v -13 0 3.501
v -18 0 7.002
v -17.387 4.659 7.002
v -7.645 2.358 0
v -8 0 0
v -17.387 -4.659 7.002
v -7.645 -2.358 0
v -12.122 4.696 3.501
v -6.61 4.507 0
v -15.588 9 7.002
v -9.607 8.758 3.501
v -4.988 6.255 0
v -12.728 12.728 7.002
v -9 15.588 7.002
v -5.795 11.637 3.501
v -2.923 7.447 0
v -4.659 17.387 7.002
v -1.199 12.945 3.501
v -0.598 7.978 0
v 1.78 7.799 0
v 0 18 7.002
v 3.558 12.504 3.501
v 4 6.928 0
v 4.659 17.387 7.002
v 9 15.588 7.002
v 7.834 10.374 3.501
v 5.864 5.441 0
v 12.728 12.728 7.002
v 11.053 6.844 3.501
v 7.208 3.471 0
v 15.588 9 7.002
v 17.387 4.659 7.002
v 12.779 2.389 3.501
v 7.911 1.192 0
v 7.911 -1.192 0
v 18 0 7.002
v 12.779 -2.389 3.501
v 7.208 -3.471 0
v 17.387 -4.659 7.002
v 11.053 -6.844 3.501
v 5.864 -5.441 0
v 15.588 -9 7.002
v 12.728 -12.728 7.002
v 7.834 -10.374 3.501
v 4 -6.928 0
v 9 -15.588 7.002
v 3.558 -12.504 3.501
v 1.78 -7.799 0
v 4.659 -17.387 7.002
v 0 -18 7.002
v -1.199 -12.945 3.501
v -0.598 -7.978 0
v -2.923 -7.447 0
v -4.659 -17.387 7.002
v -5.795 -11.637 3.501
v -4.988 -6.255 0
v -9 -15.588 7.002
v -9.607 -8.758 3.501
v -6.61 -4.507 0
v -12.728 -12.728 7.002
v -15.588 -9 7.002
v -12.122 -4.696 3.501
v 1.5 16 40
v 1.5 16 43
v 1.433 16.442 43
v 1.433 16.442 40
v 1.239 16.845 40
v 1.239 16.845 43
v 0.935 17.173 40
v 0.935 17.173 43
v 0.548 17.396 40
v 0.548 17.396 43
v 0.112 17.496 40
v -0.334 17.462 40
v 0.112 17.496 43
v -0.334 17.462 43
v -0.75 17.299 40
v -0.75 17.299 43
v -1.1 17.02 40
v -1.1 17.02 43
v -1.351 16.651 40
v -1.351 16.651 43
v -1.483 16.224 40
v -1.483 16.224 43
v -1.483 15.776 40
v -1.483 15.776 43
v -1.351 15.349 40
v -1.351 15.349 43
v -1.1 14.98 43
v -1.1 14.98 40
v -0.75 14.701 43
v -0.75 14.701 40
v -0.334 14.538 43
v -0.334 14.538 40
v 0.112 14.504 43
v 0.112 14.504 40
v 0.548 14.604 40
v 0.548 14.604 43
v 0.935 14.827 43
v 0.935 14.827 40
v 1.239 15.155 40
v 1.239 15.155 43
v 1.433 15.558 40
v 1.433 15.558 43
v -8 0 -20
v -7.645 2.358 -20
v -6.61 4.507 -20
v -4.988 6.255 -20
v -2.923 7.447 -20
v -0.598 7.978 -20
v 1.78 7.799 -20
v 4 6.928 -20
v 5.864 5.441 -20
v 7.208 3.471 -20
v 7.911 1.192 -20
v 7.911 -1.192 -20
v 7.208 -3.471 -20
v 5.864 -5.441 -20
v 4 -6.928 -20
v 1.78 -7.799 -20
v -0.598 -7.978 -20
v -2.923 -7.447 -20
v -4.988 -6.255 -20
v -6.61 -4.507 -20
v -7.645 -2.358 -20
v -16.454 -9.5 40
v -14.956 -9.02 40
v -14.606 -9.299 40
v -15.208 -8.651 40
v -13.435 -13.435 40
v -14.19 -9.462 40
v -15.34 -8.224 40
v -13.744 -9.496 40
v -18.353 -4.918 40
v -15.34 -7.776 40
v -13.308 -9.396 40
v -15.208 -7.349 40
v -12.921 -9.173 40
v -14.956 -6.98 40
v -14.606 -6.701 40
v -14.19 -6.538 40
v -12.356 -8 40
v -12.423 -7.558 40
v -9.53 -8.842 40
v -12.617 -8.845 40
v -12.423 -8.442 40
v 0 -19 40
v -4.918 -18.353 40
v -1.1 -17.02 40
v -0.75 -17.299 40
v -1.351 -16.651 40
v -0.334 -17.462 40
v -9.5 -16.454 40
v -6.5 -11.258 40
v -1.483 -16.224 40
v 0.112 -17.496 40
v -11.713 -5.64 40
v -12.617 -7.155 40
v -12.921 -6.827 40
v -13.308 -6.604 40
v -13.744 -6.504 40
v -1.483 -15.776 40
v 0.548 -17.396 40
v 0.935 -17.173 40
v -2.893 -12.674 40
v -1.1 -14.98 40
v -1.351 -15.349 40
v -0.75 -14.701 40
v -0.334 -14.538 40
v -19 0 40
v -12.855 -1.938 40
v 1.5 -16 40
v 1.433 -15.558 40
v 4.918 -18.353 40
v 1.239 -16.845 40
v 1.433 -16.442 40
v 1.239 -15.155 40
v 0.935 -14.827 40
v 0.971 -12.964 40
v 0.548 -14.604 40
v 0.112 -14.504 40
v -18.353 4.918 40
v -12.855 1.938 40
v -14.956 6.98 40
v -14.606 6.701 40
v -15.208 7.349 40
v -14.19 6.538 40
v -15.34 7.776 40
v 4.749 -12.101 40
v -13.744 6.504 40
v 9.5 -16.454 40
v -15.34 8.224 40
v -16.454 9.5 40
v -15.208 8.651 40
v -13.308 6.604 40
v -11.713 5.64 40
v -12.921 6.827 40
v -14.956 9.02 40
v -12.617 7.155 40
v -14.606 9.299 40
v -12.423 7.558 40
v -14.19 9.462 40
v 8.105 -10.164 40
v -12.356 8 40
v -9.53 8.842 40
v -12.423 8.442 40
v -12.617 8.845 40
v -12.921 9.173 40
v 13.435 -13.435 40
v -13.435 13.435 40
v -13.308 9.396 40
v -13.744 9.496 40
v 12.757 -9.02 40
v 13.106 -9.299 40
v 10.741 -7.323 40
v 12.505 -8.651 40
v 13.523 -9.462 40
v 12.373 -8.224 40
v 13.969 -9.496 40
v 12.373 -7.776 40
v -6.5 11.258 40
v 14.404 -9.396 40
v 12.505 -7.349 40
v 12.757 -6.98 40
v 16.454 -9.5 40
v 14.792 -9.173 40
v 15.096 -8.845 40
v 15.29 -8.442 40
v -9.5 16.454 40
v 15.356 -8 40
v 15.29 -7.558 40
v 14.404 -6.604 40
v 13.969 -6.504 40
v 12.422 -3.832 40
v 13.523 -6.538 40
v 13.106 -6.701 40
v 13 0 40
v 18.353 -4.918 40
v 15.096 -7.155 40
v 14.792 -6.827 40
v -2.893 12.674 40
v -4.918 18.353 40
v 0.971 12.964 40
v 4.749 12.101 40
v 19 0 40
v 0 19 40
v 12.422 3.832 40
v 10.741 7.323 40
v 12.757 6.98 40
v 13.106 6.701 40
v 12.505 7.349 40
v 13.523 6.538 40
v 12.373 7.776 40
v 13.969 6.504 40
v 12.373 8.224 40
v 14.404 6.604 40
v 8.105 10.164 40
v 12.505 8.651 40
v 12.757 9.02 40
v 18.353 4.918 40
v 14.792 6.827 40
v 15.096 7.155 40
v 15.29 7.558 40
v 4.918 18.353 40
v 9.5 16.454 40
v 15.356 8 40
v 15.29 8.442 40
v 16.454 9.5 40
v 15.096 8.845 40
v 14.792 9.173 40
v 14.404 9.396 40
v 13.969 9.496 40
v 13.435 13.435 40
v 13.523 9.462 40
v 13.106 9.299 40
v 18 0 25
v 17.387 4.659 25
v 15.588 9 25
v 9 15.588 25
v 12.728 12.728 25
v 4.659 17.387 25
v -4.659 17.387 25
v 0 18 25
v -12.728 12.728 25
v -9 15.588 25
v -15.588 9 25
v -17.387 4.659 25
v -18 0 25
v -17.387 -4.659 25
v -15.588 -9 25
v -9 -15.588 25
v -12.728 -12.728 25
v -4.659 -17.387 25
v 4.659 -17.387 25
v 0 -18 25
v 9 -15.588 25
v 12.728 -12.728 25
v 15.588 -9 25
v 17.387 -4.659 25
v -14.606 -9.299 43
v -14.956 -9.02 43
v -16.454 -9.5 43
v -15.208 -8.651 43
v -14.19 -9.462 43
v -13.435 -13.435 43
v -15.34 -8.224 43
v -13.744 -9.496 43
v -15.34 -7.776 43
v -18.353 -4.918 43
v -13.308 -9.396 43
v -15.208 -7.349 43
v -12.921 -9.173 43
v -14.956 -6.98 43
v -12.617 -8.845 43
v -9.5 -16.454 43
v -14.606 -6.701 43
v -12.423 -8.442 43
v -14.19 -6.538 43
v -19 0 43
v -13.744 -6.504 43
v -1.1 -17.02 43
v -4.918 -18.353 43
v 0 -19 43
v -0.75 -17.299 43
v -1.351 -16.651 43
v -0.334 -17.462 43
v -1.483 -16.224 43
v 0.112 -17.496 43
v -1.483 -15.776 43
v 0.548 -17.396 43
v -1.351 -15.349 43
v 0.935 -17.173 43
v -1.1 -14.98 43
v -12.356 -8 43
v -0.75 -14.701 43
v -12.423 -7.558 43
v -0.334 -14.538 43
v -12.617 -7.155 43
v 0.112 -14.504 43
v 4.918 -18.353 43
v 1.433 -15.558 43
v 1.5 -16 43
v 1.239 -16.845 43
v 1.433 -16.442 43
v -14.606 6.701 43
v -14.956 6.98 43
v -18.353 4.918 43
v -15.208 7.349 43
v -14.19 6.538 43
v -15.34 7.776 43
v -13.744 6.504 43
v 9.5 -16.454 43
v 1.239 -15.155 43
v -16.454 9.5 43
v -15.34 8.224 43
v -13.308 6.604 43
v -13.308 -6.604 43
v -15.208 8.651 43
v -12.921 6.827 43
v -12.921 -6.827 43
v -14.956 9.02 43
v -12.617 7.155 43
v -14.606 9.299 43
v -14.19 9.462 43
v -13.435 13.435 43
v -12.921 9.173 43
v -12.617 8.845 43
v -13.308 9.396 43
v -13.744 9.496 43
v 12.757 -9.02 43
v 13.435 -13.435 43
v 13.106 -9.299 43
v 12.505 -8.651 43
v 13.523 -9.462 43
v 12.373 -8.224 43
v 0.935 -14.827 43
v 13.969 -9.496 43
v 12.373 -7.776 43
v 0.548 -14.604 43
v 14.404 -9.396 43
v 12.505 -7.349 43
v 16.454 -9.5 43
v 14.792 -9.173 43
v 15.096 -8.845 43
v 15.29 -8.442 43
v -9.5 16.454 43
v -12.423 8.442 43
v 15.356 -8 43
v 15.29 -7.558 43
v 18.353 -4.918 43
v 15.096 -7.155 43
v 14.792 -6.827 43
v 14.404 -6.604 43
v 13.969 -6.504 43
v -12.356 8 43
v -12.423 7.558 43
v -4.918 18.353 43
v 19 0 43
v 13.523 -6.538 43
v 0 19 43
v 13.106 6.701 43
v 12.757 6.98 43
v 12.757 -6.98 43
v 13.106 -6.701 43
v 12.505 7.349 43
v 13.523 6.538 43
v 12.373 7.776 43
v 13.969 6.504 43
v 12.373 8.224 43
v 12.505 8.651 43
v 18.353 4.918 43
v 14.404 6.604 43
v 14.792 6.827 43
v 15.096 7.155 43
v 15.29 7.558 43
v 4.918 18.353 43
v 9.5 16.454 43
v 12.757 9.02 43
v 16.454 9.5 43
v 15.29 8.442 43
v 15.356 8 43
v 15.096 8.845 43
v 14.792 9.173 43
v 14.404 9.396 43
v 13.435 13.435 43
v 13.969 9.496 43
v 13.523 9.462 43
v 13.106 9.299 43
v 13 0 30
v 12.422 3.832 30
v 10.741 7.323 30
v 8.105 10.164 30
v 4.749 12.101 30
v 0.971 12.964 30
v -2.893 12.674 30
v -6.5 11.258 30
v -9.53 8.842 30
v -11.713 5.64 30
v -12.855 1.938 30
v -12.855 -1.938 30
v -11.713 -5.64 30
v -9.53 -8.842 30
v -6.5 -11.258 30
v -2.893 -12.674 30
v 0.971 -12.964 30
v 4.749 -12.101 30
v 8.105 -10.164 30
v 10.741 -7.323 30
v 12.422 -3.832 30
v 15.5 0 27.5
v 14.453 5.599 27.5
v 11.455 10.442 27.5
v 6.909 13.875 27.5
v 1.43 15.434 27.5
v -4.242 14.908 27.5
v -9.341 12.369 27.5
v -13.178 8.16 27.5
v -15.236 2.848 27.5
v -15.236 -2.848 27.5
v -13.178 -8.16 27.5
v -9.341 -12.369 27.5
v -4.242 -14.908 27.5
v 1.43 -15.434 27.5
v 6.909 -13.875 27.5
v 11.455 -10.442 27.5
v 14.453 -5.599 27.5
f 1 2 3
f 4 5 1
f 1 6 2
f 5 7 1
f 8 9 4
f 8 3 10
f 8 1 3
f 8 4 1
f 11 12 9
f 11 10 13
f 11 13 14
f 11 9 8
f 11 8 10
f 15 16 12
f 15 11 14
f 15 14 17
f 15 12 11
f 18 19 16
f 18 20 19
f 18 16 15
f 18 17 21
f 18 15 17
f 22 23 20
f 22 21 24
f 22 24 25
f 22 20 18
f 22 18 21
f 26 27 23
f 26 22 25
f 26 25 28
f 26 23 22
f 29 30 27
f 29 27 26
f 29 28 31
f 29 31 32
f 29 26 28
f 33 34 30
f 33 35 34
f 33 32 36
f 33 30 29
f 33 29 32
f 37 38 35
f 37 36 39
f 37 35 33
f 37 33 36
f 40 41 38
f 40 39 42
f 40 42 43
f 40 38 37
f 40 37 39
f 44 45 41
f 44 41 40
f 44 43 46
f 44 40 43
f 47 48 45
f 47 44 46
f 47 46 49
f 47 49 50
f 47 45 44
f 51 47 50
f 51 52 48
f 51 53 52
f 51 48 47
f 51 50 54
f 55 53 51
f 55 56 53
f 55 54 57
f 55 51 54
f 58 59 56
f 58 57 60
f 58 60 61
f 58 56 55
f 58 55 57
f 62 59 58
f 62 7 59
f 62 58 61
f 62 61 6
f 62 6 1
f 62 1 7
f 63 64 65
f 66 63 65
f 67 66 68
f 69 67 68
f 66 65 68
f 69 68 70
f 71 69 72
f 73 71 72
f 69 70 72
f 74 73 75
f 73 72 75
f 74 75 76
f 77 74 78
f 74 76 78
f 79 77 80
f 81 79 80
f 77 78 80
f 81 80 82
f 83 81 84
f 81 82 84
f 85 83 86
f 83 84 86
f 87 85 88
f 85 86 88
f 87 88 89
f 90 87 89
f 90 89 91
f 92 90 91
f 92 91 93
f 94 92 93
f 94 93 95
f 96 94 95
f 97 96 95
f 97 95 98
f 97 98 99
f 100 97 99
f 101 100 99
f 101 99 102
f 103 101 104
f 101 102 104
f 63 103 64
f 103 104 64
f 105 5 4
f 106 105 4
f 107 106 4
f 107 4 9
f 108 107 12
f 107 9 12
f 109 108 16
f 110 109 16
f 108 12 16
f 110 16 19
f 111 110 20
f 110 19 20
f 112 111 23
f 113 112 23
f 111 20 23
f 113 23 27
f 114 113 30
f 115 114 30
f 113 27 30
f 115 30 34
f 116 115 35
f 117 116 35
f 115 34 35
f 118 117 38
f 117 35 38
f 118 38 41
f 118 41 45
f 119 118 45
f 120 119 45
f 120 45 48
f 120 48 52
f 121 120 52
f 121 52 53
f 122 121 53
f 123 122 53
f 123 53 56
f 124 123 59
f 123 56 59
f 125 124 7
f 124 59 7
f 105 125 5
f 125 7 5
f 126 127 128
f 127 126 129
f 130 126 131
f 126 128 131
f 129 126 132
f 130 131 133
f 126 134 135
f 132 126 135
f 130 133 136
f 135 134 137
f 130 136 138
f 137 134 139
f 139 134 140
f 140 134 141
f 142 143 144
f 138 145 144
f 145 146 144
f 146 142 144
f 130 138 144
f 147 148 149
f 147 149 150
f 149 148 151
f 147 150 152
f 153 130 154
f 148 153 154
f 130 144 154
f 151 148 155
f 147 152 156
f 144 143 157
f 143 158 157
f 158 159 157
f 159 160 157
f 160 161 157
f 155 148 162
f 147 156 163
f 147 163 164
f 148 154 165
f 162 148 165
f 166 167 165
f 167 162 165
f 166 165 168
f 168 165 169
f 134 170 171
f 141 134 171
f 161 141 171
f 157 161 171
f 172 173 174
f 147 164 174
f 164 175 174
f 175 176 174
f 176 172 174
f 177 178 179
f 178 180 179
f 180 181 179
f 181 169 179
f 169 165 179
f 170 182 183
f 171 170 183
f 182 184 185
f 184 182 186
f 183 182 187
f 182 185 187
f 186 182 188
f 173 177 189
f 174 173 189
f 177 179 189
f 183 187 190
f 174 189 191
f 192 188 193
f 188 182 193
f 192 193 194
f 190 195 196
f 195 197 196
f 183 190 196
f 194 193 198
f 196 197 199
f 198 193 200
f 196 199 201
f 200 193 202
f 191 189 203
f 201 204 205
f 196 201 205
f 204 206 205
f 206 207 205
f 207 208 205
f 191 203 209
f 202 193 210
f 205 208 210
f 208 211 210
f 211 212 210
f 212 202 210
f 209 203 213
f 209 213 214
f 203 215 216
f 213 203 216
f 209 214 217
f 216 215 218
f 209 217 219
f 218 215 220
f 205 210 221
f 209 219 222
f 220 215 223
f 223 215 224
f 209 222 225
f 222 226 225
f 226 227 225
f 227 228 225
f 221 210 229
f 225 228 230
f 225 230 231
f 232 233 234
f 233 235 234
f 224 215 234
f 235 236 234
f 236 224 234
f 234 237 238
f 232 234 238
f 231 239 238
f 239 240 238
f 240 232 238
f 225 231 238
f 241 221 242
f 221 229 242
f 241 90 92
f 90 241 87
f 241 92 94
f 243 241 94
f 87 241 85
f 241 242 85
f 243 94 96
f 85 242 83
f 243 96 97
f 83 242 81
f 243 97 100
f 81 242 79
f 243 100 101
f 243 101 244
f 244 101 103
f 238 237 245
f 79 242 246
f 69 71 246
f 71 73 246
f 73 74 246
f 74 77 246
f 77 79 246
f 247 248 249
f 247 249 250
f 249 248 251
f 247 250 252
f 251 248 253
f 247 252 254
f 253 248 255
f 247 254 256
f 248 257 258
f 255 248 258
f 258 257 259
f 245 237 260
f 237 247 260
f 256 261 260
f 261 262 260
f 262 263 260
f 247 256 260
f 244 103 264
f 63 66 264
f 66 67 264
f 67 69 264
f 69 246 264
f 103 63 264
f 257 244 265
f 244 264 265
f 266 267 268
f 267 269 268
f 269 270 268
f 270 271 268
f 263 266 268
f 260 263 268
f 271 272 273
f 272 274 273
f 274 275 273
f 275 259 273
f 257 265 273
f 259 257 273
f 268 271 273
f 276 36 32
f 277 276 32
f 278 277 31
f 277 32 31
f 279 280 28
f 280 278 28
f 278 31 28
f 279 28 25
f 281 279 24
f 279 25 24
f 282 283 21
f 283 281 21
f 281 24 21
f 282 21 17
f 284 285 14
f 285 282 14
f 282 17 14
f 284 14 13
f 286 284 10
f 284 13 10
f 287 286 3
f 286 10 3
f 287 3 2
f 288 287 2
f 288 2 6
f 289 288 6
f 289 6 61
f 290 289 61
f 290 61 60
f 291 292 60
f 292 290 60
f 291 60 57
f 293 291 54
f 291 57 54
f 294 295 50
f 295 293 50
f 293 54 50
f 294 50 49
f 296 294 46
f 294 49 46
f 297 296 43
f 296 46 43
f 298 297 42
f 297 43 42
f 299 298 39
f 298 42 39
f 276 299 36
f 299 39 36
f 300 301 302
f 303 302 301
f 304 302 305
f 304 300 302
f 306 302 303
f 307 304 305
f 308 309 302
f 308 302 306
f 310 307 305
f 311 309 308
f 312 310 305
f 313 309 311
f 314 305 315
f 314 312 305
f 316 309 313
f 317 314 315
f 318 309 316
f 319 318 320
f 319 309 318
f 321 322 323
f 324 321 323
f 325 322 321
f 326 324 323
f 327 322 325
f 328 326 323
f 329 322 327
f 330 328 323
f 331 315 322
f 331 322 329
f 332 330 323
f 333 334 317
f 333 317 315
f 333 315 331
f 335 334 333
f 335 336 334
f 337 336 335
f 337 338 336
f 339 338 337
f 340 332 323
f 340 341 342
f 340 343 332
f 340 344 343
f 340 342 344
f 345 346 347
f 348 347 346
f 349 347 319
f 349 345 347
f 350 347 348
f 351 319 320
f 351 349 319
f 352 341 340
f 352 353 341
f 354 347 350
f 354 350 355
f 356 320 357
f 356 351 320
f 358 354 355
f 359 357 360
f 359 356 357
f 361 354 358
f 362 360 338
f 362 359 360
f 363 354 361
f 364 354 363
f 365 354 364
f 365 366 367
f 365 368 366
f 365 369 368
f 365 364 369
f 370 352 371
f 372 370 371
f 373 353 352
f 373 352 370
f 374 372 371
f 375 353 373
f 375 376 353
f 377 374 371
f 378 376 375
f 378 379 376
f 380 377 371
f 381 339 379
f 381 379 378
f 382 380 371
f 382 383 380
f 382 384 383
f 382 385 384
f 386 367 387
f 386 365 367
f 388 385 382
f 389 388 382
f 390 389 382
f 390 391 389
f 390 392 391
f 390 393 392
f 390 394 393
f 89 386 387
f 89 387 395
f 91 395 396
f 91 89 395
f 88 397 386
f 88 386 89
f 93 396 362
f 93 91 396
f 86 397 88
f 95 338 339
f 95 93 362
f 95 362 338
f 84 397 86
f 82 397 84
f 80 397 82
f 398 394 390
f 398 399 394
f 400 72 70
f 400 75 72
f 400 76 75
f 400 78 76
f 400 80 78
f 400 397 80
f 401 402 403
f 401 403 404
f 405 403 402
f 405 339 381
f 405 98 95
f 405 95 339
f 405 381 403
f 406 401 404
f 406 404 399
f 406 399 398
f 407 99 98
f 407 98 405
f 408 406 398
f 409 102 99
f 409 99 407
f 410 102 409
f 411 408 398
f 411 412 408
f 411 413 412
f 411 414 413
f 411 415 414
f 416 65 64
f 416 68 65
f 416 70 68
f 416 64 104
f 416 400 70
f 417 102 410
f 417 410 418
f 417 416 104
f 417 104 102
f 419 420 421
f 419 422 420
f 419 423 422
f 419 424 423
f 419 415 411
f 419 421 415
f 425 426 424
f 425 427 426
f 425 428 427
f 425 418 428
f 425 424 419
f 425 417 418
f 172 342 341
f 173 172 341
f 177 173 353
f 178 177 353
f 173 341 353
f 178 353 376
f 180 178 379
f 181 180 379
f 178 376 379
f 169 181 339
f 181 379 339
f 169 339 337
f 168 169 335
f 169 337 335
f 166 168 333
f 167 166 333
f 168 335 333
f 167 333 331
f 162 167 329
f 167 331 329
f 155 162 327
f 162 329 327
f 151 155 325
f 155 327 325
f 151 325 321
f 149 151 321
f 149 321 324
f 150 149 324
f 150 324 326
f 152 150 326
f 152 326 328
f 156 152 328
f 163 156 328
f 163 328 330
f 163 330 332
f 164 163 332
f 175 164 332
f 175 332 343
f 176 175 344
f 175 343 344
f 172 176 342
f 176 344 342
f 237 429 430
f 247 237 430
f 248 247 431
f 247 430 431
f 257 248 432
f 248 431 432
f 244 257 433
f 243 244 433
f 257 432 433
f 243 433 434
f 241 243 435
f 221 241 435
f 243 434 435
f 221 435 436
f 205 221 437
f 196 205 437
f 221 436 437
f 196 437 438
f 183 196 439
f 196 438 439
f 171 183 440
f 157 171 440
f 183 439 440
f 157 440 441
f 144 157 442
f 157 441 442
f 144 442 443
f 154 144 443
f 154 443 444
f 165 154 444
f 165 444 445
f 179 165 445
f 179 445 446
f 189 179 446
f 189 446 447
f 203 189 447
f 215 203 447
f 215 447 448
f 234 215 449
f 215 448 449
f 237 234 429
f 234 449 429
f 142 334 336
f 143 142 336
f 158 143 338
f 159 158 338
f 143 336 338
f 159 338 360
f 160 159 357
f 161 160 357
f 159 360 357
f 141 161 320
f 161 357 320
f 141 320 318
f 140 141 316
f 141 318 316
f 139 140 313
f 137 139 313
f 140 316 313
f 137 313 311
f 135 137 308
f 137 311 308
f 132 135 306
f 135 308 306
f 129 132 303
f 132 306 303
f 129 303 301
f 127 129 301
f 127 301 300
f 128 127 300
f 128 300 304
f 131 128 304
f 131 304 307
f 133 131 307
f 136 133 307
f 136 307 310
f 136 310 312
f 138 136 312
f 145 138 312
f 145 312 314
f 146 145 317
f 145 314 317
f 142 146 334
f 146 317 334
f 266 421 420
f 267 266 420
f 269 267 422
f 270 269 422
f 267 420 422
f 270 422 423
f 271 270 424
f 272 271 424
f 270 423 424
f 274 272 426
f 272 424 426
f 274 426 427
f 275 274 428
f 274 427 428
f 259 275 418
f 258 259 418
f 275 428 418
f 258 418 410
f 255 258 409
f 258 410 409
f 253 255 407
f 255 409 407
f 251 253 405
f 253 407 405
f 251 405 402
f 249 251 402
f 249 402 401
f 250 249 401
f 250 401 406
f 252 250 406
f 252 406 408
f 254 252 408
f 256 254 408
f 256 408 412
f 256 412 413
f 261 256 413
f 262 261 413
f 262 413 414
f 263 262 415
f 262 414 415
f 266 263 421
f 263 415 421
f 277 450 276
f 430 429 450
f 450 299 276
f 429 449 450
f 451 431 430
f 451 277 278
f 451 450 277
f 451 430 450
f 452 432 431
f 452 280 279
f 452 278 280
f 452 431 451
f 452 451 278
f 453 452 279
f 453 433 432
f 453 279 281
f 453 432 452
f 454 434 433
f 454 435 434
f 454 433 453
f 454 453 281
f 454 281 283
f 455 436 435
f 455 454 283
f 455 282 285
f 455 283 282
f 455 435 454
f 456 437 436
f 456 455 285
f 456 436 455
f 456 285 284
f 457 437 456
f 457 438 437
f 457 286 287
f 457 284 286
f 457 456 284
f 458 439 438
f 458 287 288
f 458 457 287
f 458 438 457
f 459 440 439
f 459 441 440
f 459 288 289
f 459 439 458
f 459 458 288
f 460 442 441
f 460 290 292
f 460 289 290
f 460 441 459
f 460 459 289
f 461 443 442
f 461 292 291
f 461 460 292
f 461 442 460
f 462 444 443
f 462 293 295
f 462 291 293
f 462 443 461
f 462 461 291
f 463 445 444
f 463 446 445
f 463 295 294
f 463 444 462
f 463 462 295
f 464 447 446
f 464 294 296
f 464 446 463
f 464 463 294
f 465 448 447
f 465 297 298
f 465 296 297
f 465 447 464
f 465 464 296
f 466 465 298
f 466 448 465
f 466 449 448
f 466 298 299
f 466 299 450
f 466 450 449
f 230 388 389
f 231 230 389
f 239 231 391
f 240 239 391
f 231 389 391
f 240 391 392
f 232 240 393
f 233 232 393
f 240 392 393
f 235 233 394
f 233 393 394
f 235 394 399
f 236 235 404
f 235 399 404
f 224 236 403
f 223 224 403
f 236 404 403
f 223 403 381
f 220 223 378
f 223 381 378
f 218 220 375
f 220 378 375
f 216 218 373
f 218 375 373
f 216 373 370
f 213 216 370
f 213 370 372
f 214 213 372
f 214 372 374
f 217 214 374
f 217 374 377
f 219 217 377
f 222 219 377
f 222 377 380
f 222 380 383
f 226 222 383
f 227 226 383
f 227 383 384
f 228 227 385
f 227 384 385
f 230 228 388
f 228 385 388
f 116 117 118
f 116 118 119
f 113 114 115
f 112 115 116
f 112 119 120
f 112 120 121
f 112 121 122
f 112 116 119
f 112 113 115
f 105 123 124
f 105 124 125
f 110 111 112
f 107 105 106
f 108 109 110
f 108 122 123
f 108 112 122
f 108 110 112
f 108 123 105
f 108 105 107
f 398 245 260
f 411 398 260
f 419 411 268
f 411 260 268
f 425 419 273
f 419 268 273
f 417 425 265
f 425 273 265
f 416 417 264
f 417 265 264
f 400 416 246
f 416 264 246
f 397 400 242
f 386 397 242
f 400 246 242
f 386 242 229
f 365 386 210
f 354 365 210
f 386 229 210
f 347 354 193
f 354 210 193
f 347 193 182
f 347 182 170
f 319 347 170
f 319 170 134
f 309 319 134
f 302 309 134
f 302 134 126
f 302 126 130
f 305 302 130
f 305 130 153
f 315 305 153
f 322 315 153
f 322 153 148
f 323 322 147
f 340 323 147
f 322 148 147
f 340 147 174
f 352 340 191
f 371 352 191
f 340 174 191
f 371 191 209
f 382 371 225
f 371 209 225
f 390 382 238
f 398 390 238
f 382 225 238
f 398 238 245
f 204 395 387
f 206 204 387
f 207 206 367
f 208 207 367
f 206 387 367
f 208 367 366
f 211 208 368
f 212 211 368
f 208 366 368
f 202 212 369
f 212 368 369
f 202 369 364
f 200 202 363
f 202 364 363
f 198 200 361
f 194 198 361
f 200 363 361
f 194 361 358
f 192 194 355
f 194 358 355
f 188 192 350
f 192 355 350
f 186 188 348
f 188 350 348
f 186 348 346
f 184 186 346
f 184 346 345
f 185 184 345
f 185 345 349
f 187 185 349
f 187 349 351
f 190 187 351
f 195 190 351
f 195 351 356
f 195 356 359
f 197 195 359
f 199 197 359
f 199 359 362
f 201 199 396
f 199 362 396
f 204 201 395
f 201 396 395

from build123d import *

# Parameters (mm, degrees)
CROQUIS2_R              = 18
SALIENTE_EXTRUIR1_DEPTH = 30
CROQUIS3_R              = 13
SALIENTE_EXTRUIR3_DEPTH = 10
CROQUIS5_R              = 8
SALIENTE_EXTRUIR4_DEPTH = 20
CROQUIS6_OUTSIDE_W      = 69.738
CROQUIS6_OUTSIDE_H      = 69.738
CROQUIS6_OUTSIDE_R      = 13
CORTAR_EXTRUIR2_DEPTH   = 8
CORTAR_EXTRUIR2_DRAFT   = -45
CROQUIS7_OUTSIDE_W      = 76.588
CROQUIS7_OUTSIDE_H      = 76.588
CROQUIS7_OUTSIDE_R      = 8
CORTAR_EXTRUIR5_DEPTH   = 8
CORTAR_EXTRUIR5_DRAFT   = -55
CROQUIS8_R              = 19
SALIENTE_EXTRUIR5_DEPTH = 3
CROQUIS9_R              = 1.5
CORTAR_EXTRUIR6_DEPTH   = 3


with BuildPart() as part:
    # Croquis2 → Saliente-Extruir1 (new body)
    with BuildSketch(Plane.XY):
        Circle(CROQUIS2_R)
    extrude(amount=SALIENTE_EXTRUIR1_DEPTH)

    # Croquis3 → Saliente-Extruir3 (add)
    with BuildSketch(Plane.XY.offset(30)):
        Circle(CROQUIS3_R)
    extrude(amount=SALIENTE_EXTRUIR3_DEPTH)

    # Croquis5 → Saliente-Extruir4 (add)
    with BuildSketch(Plane(origin=(0, 0, 0), x_dir=(-1, 0, 0), z_dir=(0, 0, -1))):
        Circle(CROQUIS5_R)
    extrude(amount=SALIENTE_EXTRUIR4_DEPTH)


with BuildPart() as cortar_extruir2_tool:
    # Croquis6 outside → Cortar-Extruir2 (with draft: the straight prism first)
    with BuildSketch(Plane.XY.offset(30)):
        Rectangle(CROQUIS6_OUTSIDE_W, CROQUIS6_OUTSIDE_H)
        Circle(CROQUIS6_OUTSIDE_R, mode=Mode.SUBTRACT)
    extrude(amount=-CORTAR_EXTRUIR2_DEPTH)
    # Cortar-Extruir2: the draft: its side faces are tilted about the plane it starts from
    cortar_extruir2_sides = [cortar_extruir2_tool.faces().sort_by_distance(p)[0] for p in [
        (0, -34.869, 26),
        (34.869, 0, 26),
        (0, 34.869, 26),
        (-34.869, 0, 26),
        (-13, 0, 26),
    ]]
    draft(cortar_extruir2_sides, Plane.XY.offset(30), CORTAR_EXTRUIR2_DRAFT)


with BuildPart() as part_1:
    add(part.part)

    # Cortar-Extruir2: cut by cortar_extruir2_tool
    add(cortar_extruir2_tool.part, mode=Mode.SUBTRACT)


with BuildPart() as cortar_extruir5_tool:
    # Croquis7 outside → Cortar-Extruir5 (with draft: the straight prism first)
    with BuildSketch(Plane(origin=(0, 0, 0), x_dir=(-1, 0, 0), z_dir=(0, 0, -1))):
        Rectangle(CROQUIS7_OUTSIDE_W, CROQUIS7_OUTSIDE_H)
        Circle(CROQUIS7_OUTSIDE_R, mode=Mode.SUBTRACT)
    extrude(amount=-CORTAR_EXTRUIR5_DEPTH)
    # Cortar-Extruir5: the draft: its side faces are tilted about the plane it starts from
    cortar_extruir5_sides = [cortar_extruir5_tool.faces().sort_by_distance(p)[0] for p in [
        (0, -38.294, 4),
        (-38.294, 0, 4),
        (0, 38.294, 4),
        (38.294, 0, 4),
        (8, 0, 4),
    ]]
    draft(cortar_extruir5_sides, Plane(origin=(0, 0, 0), x_dir=(-1, 0, 0), z_dir=(0, 0, -1)), CORTAR_EXTRUIR5_DRAFT)


with BuildPart() as part_2:
    add(part_1.part)

    # Cortar-Extruir5: cut by cortar_extruir5_tool
    add(cortar_extruir5_tool.part, mode=Mode.SUBTRACT)

    # Croquis8 → Saliente-Extruir5 (add)
    with BuildSketch(Plane.XY.offset(40)):
        Circle(CROQUIS8_R)
    extrude(amount=SALIENTE_EXTRUIR5_DEPTH)

    # Croquis9 → Cortar-Extruir6 (cut)
    with BuildSketch(Plane.XY.offset(43)):
        with Locations((0, 16)):
            Circle(CROQUIS9_R)
        with Locations((13.856406461, 8)):
            Circle(CROQUIS9_R)
        with Locations((13.856406461, -8)):
            Circle(CROQUIS9_R)
        with Locations((0, -16)):
            Circle(CROQUIS9_R)
        with Locations((-13.856406461, -8)):
            Circle(CROQUIS9_R)
        with Locations((-13.856406461, 8)):
            Circle(CROQUIS9_R)
    extrude(amount=-CORTAR_EXTRUIR6_DEPTH, mode=Mode.SUBTRACT)


solid = part_2.part
